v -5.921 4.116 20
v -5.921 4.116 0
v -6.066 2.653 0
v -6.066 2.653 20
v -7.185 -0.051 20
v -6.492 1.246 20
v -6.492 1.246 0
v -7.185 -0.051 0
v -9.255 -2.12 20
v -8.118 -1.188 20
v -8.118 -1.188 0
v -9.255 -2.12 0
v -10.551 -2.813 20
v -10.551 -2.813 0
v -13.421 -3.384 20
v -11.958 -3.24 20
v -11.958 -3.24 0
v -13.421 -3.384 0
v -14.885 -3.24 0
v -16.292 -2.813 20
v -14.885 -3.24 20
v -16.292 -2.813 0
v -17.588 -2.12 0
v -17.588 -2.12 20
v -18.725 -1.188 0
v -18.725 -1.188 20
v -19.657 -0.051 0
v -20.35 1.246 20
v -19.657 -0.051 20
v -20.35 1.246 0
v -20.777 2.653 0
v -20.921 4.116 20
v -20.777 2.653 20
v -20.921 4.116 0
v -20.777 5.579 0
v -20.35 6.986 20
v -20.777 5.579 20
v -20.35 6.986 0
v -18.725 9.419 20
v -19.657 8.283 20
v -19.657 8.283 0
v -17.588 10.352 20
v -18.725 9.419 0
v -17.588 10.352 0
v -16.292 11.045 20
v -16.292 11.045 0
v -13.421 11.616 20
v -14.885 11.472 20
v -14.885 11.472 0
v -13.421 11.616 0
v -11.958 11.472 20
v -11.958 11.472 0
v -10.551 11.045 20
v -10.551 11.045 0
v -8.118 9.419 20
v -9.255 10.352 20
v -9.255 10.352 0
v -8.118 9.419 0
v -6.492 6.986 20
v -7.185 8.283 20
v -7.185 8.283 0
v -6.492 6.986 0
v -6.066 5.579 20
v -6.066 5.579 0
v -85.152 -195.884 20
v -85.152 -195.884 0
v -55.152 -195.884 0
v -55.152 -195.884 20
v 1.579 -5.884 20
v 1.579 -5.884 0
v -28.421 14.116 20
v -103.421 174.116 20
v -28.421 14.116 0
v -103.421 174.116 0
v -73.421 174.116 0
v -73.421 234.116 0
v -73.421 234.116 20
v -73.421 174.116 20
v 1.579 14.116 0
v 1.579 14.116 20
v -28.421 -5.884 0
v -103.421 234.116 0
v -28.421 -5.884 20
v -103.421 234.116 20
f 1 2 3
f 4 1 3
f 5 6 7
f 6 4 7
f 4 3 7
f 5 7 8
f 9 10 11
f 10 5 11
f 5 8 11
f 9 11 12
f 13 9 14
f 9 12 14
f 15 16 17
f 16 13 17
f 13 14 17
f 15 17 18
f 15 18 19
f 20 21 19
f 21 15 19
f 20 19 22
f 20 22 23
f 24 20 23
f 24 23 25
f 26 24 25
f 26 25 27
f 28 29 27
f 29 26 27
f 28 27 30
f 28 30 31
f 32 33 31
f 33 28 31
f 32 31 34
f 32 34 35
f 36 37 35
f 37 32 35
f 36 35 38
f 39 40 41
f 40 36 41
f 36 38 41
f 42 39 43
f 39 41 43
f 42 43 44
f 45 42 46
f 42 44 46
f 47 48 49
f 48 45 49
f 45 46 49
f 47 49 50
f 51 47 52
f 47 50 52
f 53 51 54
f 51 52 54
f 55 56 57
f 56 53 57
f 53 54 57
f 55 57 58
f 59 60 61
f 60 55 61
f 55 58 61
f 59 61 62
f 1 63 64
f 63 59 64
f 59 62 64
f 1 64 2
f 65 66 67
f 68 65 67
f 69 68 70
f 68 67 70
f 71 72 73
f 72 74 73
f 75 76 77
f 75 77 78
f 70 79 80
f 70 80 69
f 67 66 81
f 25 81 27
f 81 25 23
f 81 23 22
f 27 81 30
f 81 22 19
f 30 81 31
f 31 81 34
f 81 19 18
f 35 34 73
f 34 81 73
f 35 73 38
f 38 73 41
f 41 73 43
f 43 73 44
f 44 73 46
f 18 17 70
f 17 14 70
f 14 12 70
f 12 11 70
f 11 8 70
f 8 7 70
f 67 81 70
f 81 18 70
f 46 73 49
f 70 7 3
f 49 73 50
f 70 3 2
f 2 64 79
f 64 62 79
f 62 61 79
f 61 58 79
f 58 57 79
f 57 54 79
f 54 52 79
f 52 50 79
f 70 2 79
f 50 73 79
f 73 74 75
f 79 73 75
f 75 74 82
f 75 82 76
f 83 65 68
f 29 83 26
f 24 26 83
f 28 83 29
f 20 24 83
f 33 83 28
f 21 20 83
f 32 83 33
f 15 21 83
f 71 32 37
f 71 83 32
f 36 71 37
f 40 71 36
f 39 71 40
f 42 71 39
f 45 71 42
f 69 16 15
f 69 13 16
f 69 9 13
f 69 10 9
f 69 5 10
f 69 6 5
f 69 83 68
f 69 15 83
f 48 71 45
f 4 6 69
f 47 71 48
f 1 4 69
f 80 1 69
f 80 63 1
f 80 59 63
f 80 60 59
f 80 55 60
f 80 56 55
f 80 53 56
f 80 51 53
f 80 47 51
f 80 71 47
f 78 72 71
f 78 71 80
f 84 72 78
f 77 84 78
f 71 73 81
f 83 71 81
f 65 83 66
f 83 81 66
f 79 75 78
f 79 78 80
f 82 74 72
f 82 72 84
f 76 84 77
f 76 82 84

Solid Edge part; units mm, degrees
sketch "Sketch1" plane through (0, 0, 0) normal (0, 0, 1) x (1, 0, 0)
  circle A0 centre (-13.4214, 4.1158) radius 7.5
  line L0 (-103.4214, 174.1158) -> (-28.4214, 14.1158)
  line L1 (-28.4214, 14.1158) -> (-28.4214, -5.8842)
  line L2 (-28.4214, -5.8842) -> (-85.1518, -195.8842)
  line L3 (-85.1518, -195.8842) -> (-55.1518, -195.8842)
  line L4 (-55.1518, -195.8842) -> (1.5786, -5.8842)
  line L5 (1.5786, 14.1158) -> (1.5786, -5.8842)
  line L6 (-73.4214, 174.1158) -> (1.5786, 14.1158)
  line L7 (-73.4214, 234.1158) -> (-73.4214, 174.1158)
  line L8 (-103.4214, 234.1158) -> (-73.4214, 234.1158)
  line L9 (-103.4214, 174.1158) -> (-103.4214, 234.1158)
  dimension "D1" = 20
  dimension "D2" = 60
  dimension "D3" = 30
  dimension "D4" = 60
  dimension "D5" = 20
  dimension "D6" = 15
  dimension "D7" = 200
  dimension "D8" = 200
  dimension "D9" = 60
extrude "Protrusion1" add sketch "Sketch1" along normal blind 20
